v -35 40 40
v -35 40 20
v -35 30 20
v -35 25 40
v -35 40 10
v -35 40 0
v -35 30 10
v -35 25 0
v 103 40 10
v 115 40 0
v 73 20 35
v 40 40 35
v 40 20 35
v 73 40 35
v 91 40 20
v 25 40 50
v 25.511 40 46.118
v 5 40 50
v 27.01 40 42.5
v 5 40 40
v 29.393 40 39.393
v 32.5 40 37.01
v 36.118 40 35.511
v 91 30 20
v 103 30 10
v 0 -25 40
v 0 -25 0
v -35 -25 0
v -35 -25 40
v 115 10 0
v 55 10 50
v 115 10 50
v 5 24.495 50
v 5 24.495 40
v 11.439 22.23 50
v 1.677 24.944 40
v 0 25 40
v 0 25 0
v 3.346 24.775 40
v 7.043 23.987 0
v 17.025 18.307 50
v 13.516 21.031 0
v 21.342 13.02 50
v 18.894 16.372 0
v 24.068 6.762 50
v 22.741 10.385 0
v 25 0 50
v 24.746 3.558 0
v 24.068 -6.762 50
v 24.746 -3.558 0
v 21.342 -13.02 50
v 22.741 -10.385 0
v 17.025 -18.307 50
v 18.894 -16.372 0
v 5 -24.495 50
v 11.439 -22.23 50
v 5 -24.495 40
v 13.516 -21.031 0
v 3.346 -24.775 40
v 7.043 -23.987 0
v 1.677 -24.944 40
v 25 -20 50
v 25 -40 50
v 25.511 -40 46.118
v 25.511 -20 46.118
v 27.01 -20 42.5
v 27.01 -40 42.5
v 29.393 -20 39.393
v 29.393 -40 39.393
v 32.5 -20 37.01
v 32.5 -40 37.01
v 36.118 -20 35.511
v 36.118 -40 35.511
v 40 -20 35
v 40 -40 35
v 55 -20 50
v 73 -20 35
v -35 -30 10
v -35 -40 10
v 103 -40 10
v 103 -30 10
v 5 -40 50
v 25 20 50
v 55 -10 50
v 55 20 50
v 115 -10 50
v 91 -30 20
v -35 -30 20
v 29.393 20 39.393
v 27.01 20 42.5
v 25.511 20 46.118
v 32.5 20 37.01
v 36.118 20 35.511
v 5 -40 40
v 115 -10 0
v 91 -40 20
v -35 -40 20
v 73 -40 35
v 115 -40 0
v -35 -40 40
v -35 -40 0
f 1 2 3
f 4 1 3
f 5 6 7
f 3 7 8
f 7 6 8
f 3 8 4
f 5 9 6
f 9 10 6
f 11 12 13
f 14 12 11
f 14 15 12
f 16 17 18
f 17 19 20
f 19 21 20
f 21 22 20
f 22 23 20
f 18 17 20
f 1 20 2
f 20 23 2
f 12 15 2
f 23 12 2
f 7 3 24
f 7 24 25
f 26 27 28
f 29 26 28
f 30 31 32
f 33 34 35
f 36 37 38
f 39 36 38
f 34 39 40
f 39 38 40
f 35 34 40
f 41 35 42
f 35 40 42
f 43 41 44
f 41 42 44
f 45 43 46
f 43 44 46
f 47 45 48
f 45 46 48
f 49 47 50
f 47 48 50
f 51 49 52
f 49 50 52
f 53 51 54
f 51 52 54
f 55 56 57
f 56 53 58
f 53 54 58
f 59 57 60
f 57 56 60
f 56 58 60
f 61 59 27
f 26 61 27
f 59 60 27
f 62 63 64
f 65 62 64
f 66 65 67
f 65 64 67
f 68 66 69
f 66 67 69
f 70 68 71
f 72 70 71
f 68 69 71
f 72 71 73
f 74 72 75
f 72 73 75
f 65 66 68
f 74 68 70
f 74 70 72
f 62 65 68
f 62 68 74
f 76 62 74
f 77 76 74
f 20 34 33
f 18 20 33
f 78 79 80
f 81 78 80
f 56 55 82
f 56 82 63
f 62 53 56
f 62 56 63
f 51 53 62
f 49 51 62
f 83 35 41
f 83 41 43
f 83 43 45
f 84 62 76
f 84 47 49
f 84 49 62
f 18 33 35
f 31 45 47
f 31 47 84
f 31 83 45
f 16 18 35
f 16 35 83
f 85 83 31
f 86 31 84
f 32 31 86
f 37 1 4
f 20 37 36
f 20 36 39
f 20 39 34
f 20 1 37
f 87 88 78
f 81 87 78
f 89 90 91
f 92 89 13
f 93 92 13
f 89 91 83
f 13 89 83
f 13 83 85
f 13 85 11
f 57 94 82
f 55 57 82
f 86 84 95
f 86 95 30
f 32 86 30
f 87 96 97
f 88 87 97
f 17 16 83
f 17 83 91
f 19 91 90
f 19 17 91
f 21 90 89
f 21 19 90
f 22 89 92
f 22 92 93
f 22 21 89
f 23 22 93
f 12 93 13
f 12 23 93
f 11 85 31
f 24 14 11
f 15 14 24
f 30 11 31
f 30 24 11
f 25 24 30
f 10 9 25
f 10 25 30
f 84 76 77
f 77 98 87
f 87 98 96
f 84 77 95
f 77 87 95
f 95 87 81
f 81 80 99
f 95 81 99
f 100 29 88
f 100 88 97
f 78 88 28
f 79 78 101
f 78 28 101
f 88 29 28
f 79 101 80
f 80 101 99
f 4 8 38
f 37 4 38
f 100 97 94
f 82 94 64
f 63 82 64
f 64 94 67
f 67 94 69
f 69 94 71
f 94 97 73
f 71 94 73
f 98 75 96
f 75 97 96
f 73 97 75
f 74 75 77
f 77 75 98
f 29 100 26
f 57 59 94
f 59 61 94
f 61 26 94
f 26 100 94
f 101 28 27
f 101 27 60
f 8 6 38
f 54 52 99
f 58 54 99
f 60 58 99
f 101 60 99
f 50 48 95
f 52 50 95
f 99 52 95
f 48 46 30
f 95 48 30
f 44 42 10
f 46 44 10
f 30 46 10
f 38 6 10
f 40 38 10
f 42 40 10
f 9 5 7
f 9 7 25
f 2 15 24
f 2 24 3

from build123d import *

# Parameters (mm, degrees)
F1_DEPTH = 50
F2_W     = 40
F2_H     = 10
F3_DEPTH = 30
F4_DEPTH = 10
F5_DEPTH = 20


# Not quite as in the source:
# - a pattern or mirror of a feature is missing from the dataset's text; its kind, count and spacing are read off the source's solid


with BuildPart() as f1:
    # F0 (on Top) → F1 (new body)
    with BuildSketch(Plane.XY):
        with BuildLine():
            Line((-35, -25), (-35, -40))
            Line((-35, -40), (115, -40))
            Line((115, -40), (115, 40))
            Line((115, 40), (-35, 40))
            Line((-35, 40), (-35, 25))
            Line((-35, 25), (0, 25))
            ThreePointArc((0, 25), (25, 0), (0, -25))
            Line((0, -25), (-35, -25))
        make_face()
    extrude(amount=F1_DEPTH)

    # F2 (on face) → F3 (cut)
    with BuildSketch(Plane.XZ.offset(40)):
        with Locations((-15, 45)):
            Rectangle(F2_W, F2_H)
        Polygon((115, 50), (55, 50), (73, 35), (91, 20), (103, 10), (115, 0), align=None)
    f3 = extrude(amount=-F3_DEPTH, mode=Mode.SUBTRACT)

    # F3_copies: F3 across plane
    add(f3.mirror(Plane.ZX), mode=Mode.SUBTRACT)

    # F2 (on face) → F4 (cut)
    with BuildSketch(Plane.XZ.offset(40)):
        Polygon((91, 20), (-35, 20), (-35, 10), (103, 10), align=None)
    f4 = extrude(amount=-F4_DEPTH, mode=Mode.SUBTRACT)

    # F4_copies: F4 across plane
    add(f4.mirror(Plane.ZX), mode=Mode.SUBTRACT)

    # F2 (on face) → F5 (cut)
    with BuildSketch(Plane.XZ.offset(40)):
        with BuildLine():
            Line((55, 50), (25, 50))
            ThreePointArc((25, 50), (29.3933982822, 39.3933982822), (40, 35))
            Line((40, 35), (73, 35))
            Line((73, 35), (55, 50))
        make_face()
    f5 = extrude(amount=-F5_DEPTH, mode=Mode.SUBTRACT)

    # F5_copies: F5 across plane
    add(f5.mirror(Plane.ZX), mode=Mode.SUBTRACT)


solid = f1.part
